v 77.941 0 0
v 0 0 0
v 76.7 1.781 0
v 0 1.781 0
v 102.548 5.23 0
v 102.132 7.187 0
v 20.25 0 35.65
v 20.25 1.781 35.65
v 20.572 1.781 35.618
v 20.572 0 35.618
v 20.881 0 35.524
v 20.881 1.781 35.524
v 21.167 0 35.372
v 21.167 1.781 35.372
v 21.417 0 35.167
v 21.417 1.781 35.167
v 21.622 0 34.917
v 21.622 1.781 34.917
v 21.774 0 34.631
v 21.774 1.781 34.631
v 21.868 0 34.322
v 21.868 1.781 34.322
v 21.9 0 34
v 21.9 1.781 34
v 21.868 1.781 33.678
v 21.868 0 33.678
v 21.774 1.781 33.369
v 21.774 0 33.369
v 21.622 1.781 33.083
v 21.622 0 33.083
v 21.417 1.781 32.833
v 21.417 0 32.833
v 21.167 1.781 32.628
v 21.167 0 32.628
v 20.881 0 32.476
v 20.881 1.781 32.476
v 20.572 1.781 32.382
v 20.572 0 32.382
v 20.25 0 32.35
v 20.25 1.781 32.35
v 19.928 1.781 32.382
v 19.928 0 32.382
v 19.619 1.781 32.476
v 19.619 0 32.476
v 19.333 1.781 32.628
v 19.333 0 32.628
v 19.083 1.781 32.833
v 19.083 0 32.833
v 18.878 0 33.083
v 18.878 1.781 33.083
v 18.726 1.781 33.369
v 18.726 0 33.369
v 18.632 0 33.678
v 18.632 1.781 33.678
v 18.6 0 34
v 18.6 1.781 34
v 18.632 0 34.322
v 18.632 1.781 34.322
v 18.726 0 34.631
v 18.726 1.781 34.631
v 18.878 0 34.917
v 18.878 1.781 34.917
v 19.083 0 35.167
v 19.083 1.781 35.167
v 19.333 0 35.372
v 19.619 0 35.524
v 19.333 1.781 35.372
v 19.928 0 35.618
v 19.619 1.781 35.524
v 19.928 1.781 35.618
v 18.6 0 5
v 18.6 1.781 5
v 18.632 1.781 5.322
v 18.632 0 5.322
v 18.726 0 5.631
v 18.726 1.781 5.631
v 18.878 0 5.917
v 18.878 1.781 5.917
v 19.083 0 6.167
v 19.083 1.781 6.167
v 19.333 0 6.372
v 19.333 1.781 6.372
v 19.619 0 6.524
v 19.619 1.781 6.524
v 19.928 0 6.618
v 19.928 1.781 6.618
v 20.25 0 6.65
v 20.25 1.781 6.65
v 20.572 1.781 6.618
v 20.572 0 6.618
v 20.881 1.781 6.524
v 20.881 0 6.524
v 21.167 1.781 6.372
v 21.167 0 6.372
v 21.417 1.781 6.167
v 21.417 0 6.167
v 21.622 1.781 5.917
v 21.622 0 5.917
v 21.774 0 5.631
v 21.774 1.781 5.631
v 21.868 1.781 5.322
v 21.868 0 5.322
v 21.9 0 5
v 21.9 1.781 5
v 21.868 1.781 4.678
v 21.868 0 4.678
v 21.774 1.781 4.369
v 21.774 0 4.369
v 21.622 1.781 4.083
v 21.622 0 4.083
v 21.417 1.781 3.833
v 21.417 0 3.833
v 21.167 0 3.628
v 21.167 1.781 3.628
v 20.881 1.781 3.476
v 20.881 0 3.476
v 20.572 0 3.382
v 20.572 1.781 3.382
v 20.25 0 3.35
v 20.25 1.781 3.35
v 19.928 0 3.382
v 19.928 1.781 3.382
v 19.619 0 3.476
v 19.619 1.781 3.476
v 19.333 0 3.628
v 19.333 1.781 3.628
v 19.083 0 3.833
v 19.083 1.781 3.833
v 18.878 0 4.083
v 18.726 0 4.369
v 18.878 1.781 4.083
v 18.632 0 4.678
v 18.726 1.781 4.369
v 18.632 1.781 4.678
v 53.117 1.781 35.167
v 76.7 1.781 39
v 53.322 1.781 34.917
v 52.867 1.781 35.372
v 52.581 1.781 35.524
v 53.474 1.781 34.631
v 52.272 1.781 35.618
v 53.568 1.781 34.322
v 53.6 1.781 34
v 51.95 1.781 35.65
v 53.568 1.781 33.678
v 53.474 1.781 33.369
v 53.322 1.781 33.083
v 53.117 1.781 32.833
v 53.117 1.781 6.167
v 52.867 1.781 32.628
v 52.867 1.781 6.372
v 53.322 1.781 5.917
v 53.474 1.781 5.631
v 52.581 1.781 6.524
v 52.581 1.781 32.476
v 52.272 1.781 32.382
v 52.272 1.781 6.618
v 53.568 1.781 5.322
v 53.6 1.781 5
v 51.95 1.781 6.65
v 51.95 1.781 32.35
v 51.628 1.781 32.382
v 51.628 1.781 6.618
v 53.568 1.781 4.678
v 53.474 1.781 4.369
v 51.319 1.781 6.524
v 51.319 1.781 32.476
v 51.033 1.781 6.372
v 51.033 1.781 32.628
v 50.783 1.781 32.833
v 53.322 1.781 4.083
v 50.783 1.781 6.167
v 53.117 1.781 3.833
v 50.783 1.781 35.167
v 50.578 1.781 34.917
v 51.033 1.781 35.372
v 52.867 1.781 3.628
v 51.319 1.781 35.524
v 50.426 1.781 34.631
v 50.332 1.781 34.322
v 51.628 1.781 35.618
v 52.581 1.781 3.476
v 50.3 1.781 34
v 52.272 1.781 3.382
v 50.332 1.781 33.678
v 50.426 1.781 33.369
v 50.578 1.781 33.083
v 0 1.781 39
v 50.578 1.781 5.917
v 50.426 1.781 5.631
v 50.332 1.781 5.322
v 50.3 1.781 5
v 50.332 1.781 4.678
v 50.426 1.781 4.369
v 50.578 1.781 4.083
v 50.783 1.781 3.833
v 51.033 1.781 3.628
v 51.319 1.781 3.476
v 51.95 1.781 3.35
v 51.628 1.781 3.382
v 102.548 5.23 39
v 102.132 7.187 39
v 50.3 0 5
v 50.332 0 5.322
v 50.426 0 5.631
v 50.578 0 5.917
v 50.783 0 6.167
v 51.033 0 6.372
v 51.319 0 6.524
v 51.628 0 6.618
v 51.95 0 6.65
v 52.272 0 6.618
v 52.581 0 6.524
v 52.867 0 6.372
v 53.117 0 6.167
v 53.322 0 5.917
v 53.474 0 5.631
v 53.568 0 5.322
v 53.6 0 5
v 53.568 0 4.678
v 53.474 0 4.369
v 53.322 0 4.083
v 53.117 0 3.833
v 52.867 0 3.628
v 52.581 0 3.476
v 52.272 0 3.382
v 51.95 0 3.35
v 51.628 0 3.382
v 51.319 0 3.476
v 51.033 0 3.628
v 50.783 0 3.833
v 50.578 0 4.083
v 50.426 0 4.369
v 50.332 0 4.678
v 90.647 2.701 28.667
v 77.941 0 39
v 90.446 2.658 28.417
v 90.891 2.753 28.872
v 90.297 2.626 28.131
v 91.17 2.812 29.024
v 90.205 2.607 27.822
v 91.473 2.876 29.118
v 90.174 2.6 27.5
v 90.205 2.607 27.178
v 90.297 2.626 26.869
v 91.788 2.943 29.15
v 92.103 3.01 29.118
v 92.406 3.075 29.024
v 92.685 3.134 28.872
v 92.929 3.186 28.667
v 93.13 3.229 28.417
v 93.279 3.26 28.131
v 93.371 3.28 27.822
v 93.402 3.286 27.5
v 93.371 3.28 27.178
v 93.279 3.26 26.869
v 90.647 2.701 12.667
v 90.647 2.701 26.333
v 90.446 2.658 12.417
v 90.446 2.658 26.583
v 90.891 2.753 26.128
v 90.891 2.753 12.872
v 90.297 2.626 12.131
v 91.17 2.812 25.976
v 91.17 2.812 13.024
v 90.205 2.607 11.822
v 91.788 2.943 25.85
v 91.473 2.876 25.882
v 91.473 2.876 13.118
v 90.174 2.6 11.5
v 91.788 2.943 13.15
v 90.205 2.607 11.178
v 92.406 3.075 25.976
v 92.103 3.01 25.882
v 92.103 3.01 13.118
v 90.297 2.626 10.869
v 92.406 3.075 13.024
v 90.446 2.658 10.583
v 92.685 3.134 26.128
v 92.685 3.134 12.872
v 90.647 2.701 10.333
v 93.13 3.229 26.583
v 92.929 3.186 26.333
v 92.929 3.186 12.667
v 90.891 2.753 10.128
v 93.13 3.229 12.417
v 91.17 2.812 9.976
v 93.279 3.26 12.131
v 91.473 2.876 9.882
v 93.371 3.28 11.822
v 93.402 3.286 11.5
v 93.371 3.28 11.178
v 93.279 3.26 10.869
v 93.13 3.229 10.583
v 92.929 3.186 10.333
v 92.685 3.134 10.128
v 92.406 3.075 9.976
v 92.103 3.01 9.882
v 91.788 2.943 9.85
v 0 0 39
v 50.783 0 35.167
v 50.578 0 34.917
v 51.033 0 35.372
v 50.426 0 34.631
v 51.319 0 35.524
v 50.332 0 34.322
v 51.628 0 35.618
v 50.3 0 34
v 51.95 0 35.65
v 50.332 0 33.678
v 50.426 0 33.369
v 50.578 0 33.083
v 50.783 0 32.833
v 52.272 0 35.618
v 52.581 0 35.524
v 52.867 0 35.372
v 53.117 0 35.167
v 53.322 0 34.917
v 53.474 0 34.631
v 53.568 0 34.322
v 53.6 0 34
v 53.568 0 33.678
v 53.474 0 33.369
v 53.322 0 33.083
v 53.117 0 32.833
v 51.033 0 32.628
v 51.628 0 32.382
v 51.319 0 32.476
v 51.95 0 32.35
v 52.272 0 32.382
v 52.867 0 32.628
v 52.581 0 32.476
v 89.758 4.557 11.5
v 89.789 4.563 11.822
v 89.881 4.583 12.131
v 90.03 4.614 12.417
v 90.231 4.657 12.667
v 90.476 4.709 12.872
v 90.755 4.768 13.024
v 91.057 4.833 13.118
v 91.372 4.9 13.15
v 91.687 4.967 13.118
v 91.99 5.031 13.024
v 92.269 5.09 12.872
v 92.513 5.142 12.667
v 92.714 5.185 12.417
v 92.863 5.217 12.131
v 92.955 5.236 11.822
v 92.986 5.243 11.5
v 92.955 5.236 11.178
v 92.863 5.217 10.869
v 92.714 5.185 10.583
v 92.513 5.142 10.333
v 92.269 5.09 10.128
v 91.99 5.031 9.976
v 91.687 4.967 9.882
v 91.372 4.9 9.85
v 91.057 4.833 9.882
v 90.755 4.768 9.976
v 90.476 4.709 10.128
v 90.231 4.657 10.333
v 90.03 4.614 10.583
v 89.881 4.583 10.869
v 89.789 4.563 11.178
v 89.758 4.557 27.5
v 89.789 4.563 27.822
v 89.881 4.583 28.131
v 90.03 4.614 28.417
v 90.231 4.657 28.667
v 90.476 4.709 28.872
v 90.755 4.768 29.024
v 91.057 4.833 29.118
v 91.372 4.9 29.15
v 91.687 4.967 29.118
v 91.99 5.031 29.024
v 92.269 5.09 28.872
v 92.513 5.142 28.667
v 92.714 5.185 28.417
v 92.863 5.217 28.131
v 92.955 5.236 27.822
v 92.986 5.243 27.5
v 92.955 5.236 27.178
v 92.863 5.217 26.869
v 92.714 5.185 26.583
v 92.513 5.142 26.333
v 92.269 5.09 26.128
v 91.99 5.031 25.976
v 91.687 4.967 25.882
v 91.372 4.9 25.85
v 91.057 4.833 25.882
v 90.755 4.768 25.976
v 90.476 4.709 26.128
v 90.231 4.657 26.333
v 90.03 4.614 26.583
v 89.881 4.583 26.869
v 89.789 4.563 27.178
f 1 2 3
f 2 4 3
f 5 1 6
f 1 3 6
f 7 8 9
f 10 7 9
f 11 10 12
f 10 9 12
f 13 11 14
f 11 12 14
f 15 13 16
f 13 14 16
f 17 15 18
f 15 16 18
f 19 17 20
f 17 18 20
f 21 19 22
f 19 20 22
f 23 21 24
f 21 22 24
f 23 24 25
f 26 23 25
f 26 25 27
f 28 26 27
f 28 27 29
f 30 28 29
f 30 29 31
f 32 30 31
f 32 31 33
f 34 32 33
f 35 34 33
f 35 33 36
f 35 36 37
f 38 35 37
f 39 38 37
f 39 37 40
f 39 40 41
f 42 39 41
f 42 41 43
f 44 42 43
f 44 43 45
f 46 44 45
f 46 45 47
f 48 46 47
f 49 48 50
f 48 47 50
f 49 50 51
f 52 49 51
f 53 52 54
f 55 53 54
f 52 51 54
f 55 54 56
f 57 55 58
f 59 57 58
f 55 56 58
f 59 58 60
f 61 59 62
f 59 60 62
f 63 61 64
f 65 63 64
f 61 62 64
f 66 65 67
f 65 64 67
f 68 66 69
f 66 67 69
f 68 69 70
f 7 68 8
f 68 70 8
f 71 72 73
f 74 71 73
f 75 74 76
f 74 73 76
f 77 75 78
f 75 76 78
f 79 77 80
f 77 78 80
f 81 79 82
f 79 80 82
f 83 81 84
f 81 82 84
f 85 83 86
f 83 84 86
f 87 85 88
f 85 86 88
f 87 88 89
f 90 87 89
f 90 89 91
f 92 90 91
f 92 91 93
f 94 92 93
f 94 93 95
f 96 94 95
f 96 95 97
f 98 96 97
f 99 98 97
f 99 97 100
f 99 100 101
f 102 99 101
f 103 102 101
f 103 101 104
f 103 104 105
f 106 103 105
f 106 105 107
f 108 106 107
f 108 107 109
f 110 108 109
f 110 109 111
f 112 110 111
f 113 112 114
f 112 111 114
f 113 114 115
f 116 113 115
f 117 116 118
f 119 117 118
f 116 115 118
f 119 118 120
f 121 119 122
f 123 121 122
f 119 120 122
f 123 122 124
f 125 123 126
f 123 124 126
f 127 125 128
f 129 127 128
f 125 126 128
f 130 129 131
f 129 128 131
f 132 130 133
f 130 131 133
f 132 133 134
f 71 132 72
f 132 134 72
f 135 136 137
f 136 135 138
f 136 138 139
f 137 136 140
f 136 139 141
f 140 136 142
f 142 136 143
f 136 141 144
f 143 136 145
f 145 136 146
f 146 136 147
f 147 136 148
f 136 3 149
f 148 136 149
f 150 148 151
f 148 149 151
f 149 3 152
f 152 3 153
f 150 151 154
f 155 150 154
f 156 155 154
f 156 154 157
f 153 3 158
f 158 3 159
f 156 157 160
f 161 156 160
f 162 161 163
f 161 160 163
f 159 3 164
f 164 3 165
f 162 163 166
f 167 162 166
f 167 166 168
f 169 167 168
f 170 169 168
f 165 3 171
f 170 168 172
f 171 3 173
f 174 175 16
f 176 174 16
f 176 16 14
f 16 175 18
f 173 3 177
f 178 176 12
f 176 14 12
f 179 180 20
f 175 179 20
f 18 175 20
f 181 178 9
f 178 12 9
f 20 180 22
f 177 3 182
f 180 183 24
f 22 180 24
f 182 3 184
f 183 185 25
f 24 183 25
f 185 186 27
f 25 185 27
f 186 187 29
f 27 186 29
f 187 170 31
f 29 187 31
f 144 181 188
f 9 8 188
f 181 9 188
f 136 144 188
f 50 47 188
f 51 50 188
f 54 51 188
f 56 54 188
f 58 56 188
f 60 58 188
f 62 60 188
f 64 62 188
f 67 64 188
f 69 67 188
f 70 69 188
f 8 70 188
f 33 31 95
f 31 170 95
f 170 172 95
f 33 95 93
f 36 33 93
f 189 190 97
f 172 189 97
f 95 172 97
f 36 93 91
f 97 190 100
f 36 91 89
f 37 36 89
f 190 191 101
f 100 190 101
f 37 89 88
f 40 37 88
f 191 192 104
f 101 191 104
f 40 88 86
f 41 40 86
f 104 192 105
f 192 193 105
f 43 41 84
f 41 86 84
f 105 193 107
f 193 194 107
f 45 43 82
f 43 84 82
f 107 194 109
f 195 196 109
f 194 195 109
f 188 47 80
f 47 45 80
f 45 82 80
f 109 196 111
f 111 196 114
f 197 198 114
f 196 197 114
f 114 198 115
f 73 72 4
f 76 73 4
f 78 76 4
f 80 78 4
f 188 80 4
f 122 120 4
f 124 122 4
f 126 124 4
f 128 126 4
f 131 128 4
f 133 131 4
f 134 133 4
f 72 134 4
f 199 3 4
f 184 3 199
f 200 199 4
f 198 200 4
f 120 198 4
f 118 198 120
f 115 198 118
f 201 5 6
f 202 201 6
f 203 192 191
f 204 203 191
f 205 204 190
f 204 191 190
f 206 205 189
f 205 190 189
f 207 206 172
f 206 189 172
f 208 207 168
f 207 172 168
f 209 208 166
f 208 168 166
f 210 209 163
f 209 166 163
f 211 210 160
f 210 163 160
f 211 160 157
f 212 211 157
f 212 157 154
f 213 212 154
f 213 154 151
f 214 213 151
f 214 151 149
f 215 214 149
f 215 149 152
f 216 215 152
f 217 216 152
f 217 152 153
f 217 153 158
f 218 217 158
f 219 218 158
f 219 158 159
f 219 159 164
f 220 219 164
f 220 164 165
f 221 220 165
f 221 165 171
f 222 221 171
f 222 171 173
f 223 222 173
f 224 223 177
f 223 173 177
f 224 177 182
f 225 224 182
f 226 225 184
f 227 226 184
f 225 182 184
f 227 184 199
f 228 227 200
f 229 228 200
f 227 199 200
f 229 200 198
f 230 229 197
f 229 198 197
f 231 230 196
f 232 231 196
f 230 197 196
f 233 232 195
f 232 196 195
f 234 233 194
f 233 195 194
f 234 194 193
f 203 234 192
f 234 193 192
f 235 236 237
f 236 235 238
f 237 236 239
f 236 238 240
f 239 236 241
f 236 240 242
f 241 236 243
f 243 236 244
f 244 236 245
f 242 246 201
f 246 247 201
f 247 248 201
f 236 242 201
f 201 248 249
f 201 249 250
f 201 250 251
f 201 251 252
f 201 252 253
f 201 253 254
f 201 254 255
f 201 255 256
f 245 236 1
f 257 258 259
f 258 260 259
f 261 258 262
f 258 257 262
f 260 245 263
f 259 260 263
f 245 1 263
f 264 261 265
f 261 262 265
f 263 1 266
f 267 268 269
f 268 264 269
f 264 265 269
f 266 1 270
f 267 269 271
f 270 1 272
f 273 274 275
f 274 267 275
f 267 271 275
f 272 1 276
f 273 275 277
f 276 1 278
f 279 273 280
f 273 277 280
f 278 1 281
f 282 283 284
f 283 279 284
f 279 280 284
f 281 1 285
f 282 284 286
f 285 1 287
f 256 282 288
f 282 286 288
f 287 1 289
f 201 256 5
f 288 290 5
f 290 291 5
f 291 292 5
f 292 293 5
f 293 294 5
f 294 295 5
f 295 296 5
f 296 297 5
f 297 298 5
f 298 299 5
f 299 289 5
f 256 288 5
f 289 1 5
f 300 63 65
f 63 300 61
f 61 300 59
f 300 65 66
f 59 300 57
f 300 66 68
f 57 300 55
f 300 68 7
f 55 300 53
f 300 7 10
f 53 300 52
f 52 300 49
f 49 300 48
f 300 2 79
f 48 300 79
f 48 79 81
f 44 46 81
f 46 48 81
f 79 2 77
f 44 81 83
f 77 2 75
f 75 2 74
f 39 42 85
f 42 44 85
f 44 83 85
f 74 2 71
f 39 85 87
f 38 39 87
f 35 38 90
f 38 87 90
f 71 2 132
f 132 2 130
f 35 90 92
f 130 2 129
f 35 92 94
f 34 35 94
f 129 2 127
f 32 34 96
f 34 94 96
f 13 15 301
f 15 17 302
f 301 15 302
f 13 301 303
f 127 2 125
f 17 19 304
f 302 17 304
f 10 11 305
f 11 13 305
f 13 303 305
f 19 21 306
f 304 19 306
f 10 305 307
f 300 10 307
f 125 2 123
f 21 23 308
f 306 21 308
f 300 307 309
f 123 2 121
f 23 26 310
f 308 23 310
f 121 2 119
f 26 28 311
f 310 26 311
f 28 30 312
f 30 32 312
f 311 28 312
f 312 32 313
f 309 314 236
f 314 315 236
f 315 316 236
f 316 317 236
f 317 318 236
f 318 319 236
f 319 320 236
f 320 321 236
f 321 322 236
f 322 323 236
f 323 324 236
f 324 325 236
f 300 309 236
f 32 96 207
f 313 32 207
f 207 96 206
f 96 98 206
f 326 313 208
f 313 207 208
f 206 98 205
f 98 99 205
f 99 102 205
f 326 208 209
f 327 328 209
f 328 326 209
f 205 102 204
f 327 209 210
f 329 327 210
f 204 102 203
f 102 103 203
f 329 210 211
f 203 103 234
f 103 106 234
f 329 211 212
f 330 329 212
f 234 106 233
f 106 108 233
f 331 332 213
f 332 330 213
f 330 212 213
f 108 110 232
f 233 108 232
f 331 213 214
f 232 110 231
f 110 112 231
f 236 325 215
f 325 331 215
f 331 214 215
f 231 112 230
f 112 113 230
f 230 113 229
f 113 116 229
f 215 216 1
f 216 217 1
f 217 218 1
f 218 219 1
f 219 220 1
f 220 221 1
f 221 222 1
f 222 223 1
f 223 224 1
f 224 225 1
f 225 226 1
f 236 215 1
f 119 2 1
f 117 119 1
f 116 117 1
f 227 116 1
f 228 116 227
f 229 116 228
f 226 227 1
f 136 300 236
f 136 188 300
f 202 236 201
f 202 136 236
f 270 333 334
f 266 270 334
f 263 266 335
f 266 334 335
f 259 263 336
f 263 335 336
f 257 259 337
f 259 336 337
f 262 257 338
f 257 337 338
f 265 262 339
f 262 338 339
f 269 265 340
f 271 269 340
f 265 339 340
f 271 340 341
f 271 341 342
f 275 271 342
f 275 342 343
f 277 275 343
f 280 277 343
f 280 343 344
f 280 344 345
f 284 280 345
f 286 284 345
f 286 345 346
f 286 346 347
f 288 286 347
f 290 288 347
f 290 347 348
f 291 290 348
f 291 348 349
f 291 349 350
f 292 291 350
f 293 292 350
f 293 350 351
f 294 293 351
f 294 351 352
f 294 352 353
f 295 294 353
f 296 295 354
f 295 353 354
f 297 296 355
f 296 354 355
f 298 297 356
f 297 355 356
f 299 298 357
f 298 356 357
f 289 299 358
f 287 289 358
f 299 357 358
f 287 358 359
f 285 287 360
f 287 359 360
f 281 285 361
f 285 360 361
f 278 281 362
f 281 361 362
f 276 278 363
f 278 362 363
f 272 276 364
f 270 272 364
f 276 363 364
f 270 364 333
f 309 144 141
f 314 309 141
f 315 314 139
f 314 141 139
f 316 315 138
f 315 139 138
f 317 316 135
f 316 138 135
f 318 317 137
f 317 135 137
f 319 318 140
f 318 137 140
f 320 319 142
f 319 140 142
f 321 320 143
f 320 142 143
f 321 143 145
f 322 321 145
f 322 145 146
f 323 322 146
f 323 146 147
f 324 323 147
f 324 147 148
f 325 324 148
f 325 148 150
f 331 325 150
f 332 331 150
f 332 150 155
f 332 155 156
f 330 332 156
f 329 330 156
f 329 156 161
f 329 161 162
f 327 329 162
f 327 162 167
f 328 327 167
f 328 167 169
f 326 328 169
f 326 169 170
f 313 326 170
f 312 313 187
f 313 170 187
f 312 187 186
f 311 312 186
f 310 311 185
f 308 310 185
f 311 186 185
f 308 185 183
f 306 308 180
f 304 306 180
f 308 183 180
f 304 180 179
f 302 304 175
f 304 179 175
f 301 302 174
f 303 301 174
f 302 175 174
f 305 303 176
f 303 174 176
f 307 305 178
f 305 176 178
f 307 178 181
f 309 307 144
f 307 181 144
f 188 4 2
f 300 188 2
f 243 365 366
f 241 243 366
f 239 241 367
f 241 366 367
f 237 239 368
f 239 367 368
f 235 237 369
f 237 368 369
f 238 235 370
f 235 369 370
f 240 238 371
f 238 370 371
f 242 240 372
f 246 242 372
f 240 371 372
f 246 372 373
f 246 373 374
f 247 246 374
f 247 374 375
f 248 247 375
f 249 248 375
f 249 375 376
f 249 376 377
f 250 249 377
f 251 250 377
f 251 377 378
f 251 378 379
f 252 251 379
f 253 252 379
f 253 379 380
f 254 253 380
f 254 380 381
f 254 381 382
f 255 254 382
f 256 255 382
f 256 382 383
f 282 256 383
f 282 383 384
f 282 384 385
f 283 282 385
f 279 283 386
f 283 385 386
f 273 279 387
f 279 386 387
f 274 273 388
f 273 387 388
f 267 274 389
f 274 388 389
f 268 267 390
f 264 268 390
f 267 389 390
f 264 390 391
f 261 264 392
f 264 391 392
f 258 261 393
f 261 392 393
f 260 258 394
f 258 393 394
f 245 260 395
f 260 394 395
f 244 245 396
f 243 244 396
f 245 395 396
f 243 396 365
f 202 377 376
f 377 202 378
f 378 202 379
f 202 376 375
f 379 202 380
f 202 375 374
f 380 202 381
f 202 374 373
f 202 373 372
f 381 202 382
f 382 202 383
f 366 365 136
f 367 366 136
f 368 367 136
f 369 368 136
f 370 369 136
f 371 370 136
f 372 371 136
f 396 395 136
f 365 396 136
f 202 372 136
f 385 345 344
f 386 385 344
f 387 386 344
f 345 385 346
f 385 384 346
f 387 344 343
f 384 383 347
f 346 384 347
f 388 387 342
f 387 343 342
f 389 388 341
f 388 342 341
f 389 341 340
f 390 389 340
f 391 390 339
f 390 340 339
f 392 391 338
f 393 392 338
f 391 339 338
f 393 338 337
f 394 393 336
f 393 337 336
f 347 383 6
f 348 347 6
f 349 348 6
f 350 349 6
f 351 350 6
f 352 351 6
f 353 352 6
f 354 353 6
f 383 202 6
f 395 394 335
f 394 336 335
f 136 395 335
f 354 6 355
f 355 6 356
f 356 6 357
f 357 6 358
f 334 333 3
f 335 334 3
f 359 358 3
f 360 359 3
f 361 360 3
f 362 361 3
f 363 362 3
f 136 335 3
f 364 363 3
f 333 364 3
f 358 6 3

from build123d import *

# Parameters (mm, degrees)
EXTRUDE_1_DEPTH     = 39
SKETCH_3_R          = 1.65
CUT_EXTRUDE_1_DEPTH = 10
SKETCH_4_R          = 1.65
CUT_EXTRUDE_2_DEPTH = 10


with BuildPart() as part:
    # 草图1 → 凸台-拉伸1 (new body)
    with BuildSketch(Plane.XY):
        Polygon((0, 0), (77.940672381, 0), (102.547661001, 5.230376894), (102.131837619, 7.186672096), (76.7, 1.780968134), (0, 1.780968134), align=None)
    extrude(amount=EXTRUDE_1_DEPTH)

    # 草图3 → 切除-拉伸1 (cut)
    with BuildSketch(Plane(origin=(2.953339199, -13.89436852, 0), x_dir=(0.9781476007338052, 0.20791169081776095, 0), z_dir=(-0.20791169081776098, 0.9781476007338054, 0))):
        with Locations(Location((90.394205072, -11.5, 0), (0, 0, 180))):
            Circle(SKETCH_3_R)
        with Locations(Location((90.394205072, -27.5, 0), (0, 0, 180))):
            Circle(SKETCH_3_R)
    extrude(amount=-CUT_EXTRUDE_1_DEPTH, mode=Mode.SUBTRACT)

    # 草图4 → 切除-拉伸2 (cut)
    with BuildSketch(Plane(origin=(0, 1.780968134, 0), x_dir=(1, 0, 0), z_dir=(0, 1, 0))):
        with Locations(Location((20.25, -5, 0), (0, 0, 180))):
            Circle(SKETCH_4_R)
        with Locations(Location((51.95, -5, 0), (0, 0, 180))):
            Circle(SKETCH_4_R)
        with Locations(Location((51.95, -34, 0), (0, 0, 270))):
            Circle(SKETCH_4_R)
        with Locations(Location((20.25, -34, 0), (0, 0, 270))):
            Circle(SKETCH_4_R)
    extrude(amount=-CUT_EXTRUDE_2_DEPTH, mode=Mode.SUBTRACT)


solid = part.part
